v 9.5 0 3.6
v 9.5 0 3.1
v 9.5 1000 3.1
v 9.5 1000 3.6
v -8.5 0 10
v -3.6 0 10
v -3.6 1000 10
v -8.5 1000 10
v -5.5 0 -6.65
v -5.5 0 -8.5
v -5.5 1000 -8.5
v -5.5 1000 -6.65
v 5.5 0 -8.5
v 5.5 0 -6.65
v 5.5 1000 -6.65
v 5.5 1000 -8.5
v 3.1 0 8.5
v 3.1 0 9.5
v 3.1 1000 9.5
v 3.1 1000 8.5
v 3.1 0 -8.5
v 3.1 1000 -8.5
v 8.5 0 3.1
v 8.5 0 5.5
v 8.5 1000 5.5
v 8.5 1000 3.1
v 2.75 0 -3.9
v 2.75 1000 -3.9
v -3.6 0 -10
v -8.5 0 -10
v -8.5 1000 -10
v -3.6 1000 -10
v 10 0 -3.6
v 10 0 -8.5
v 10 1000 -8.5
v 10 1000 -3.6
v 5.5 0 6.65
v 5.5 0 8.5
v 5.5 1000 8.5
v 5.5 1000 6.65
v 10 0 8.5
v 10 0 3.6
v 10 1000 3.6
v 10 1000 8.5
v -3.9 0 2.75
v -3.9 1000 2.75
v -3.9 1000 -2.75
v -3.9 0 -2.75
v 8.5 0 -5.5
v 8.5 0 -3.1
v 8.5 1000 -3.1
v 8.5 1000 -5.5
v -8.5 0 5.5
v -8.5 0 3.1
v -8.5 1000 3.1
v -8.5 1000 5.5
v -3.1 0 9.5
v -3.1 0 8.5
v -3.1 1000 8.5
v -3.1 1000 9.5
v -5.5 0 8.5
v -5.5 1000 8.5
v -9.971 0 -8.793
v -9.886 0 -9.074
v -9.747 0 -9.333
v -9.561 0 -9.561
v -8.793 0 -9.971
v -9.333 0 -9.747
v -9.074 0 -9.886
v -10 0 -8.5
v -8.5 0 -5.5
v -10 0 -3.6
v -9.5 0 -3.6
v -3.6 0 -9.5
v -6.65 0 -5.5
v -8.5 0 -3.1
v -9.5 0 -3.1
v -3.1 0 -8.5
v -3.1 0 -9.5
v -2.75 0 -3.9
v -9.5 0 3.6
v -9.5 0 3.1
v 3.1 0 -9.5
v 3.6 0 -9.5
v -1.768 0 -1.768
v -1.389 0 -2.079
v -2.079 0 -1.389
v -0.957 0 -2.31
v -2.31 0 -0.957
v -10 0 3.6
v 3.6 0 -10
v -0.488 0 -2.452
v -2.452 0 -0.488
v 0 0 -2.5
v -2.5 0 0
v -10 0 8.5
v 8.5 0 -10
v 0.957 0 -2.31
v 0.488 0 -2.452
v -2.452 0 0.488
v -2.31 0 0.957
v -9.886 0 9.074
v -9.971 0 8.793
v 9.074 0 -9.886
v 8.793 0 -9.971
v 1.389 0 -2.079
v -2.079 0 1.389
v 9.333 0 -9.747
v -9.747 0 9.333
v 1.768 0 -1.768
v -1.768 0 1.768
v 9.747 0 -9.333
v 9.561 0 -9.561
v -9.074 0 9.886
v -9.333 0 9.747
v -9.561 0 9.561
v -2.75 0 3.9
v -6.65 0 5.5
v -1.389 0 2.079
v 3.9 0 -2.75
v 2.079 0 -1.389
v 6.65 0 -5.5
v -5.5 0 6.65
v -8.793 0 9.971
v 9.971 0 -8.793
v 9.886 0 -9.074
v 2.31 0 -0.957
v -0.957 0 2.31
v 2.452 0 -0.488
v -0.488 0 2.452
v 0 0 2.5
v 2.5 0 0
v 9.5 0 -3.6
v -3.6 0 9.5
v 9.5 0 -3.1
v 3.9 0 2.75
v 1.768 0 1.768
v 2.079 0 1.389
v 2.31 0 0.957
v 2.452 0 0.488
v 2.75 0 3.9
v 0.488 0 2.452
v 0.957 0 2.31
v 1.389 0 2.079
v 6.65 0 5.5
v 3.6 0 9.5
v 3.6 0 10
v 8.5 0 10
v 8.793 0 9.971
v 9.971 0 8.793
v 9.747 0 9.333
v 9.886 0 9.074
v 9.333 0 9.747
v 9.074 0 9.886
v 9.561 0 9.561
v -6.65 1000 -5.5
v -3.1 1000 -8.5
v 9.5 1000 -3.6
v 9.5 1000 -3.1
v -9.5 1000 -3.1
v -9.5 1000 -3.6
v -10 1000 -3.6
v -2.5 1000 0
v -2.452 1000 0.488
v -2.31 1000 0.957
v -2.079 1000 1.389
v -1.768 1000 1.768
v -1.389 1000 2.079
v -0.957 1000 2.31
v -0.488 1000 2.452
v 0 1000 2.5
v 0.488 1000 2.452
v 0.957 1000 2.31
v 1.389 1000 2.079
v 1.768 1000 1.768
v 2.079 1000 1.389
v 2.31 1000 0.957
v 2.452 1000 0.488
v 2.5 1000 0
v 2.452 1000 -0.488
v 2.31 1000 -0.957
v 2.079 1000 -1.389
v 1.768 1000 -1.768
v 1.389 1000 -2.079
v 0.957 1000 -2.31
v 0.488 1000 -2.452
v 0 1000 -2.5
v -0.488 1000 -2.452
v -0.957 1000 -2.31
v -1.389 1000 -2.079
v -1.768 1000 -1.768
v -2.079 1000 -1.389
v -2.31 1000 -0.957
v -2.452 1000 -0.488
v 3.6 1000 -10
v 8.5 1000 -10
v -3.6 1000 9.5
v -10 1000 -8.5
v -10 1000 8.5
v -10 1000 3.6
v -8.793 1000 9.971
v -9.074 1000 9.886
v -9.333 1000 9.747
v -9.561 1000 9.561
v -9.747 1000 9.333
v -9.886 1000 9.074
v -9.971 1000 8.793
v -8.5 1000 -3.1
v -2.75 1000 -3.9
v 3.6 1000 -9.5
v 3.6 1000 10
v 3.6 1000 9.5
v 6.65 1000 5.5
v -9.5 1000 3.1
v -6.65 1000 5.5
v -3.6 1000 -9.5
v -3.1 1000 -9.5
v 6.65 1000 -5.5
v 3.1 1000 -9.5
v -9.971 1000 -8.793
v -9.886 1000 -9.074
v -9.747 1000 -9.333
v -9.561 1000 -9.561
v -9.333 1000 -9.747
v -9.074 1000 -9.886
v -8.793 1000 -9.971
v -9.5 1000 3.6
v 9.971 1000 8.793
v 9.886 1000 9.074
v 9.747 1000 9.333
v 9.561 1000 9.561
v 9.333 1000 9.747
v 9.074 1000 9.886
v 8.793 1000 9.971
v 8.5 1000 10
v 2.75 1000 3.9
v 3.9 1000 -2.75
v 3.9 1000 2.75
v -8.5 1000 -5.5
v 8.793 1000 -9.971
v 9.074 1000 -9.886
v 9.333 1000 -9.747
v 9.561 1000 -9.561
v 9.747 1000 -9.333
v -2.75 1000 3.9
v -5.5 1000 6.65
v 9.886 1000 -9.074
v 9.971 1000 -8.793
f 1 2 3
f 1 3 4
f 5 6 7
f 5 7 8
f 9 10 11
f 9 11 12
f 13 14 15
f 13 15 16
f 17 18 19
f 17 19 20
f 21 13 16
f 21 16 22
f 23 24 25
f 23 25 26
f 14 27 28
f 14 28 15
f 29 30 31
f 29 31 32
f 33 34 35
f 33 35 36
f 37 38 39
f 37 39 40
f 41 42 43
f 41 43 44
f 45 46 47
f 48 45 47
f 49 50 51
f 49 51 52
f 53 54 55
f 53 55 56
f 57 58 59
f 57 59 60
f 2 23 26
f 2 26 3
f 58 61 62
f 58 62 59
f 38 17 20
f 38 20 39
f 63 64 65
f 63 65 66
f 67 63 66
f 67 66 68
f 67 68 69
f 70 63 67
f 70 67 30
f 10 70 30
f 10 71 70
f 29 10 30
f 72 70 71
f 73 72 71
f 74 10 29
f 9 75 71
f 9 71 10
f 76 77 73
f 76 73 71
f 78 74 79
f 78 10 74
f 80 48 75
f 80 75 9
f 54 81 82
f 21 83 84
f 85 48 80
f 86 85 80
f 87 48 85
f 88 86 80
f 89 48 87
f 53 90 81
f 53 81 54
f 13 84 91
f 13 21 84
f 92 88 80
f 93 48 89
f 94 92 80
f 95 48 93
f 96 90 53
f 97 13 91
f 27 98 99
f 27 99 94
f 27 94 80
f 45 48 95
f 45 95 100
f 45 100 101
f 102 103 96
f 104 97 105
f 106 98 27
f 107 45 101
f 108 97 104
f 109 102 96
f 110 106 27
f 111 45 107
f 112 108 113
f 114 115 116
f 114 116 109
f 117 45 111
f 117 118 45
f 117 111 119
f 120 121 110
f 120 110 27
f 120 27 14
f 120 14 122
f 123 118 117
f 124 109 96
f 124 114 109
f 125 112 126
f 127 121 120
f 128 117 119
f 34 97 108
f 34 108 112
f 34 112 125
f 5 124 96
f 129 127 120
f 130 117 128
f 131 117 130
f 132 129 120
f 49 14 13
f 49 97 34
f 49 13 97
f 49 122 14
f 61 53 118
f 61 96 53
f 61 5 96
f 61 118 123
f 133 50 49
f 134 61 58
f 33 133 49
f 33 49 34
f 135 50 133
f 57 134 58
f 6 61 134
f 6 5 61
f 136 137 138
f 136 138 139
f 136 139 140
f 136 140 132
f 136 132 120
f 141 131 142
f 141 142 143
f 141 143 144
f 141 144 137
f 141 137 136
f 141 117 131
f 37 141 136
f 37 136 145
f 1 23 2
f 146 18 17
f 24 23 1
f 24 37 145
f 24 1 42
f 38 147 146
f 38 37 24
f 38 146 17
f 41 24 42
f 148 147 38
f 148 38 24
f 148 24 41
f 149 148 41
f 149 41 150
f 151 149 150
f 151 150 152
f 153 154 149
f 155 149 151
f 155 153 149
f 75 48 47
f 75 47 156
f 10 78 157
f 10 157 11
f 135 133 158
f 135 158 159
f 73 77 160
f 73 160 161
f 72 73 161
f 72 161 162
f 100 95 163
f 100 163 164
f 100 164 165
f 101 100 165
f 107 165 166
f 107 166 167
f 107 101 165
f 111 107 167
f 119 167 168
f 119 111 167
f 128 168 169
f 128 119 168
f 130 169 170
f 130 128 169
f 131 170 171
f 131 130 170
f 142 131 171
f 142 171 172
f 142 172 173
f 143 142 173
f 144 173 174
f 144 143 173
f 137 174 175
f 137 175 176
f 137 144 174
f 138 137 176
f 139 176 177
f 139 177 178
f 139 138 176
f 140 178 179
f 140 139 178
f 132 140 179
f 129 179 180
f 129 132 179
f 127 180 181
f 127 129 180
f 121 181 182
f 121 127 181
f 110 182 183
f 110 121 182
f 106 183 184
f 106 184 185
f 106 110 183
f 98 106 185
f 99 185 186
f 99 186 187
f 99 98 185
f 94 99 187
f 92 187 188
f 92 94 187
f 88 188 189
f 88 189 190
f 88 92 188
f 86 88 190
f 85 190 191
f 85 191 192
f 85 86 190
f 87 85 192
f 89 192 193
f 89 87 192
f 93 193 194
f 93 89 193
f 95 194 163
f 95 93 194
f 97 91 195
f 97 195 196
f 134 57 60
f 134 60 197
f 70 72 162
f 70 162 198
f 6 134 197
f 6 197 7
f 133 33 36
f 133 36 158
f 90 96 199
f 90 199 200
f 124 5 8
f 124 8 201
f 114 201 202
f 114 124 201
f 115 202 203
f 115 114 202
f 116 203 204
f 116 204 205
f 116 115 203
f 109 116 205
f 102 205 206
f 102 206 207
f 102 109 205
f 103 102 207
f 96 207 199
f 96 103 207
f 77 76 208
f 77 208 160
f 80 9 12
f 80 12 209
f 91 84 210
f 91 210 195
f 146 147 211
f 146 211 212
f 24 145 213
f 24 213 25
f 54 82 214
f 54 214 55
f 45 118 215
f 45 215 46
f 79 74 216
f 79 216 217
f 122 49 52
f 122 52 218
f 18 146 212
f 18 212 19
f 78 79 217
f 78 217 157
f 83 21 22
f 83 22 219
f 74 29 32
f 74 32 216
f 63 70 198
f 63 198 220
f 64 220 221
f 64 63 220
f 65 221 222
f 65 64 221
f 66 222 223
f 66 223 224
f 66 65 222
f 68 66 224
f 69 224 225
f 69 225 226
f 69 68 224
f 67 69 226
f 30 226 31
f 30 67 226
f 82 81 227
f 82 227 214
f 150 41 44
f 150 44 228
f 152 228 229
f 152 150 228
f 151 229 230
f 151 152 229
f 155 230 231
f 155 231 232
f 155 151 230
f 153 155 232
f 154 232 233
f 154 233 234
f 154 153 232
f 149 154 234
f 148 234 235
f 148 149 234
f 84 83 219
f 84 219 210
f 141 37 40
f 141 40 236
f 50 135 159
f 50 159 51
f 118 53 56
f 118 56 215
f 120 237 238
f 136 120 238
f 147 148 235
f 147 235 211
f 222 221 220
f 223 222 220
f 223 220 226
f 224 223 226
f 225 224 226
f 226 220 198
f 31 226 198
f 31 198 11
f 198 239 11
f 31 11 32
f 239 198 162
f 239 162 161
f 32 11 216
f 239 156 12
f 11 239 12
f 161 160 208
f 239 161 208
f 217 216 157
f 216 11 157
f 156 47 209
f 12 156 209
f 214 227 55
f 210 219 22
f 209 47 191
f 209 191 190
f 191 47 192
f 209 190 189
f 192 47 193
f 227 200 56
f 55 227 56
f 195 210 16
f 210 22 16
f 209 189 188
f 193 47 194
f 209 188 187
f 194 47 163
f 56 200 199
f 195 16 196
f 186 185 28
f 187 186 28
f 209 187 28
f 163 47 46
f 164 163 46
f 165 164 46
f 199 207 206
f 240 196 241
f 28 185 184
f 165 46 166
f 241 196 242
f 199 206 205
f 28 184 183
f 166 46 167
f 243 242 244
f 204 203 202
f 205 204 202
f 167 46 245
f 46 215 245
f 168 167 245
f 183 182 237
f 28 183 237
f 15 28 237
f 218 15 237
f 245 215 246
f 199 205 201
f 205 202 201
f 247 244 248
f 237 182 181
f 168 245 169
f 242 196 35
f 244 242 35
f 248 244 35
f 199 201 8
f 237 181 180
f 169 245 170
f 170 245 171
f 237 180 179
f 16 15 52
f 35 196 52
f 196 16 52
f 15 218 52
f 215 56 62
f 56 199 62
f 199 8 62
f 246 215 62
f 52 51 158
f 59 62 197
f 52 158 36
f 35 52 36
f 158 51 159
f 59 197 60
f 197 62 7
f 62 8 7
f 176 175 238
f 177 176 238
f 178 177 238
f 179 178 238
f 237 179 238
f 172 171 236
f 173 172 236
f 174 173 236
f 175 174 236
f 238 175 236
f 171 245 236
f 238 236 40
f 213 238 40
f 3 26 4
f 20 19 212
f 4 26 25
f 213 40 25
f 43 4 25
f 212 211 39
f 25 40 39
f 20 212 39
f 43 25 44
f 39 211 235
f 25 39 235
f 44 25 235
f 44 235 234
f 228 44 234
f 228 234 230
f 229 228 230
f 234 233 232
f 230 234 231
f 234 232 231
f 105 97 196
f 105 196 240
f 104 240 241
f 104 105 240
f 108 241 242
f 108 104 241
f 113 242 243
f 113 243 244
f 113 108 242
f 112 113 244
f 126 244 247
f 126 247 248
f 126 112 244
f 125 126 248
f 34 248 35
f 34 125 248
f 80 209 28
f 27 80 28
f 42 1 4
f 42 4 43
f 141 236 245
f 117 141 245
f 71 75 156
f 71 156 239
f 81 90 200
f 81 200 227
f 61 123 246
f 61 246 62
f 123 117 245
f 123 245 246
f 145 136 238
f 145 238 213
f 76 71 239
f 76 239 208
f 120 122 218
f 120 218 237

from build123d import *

# Parameters (mm, degrees)
SKETCH1_R                = 2.5
F_20_X_20_X_R1_5_1_DEPTH = 1000


with BuildPart() as part:
    # Sketch1 → 铝型材 20 X 20 X R1.5(1) (new body)
    with BuildSketch(Plane(origin=(0, 0, 0), x_dir=(-1, 0, 0), z_dir=(0, 1, 0))):
        with BuildLine():
            Line((-3.6, 10), (-3.6, 9.5))
            Line((-3.6, 9.5), (-3.1, 9.5))
            Line((-3.1, 9.5), (-3.1, 8.5))
            Line((-3.1, 8.5), (-5.5, 8.5))
            Line((-5.5, 8.5), (-5.5, 6.65))
            Line((-5.5, 6.65), (-2.75, 3.9))
            Line((-2.75, 3.9), (2.75, 3.9))
            Line((2.75, 3.9), (5.5, 6.65))
            Line((5.5, 6.65), (5.5, 8.5))
            Line((5.5, 8.5), (3.1, 8.5))
            Line((3.1, 8.5), (3.1, 9.5))
            Line((3.1, 9.5), (3.6, 9.5))
            Line((3.6, 9.5), (3.6, 10))
            Line((3.6, 10), (8.5, 10))
            ThreePointArc((8.5, 10), (9.560660172, 9.560660172), (10, 8.5))
            Line((10, 8.5), (10, 3.6))
            Line((10, 3.6), (9.5, 3.6))
            Line((9.5, 3.6), (9.5, 3.1))
            Line((9.5, 3.1), (8.5, 3.1))
            Line((8.5, 3.1), (8.5, 5.5))
            Line((8.5, 5.5), (6.65, 5.5))
            Line((6.65, 5.5), (3.9, 2.75))
            Line((3.9, 2.75), (3.9, -2.75))
            Line((3.9, -2.75), (6.65, -5.5))
            Line((6.65, -5.5), (8.5, -5.5))
            Line((8.5, -5.5), (8.5, -3.1))
            Line((8.5, -3.1), (9.5, -3.1))
            Line((9.5, -3.1), (9.5, -3.6))
            Line((9.5, -3.6), (10, -3.6))
            Line((10, -3.6), (10, -8.5))
            ThreePointArc((10, -8.5), (9.560660172, -9.560660172), (8.5, -10))
            Line((8.5, -10), (3.6, -10))
            Line((3.6, -10), (3.6, -9.5))
            Line((3.6, -9.5), (3.1, -9.5))
            Line((3.1, -9.5), (3.1, -8.5))
            Line((3.1, -8.5), (5.5, -8.5))
            Line((5.5, -8.5), (5.5, -6.65))
            Line((5.5, -6.65), (2.75, -3.9))
            Line((2.75, -3.9), (-2.75, -3.9))
            Line((-2.75, -3.9), (-5.5, -6.65))
            Line((-5.5, -6.65), (-5.5, -8.5))
            Line((-5.5, -8.5), (-3.1, -8.5))
            Line((-3.1, -8.5), (-3.1, -9.5))
            Line((-3.1, -9.5), (-3.6, -9.5))
            Line((-3.6, -9.5), (-3.6, -10))
            Line((-3.6, -10), (-8.5, -10))
            ThreePointArc((-8.5, -10), (-9.560660172, -9.560660172), (-10, -8.5))
            Line((-10, -8.5), (-10, -3.6))
            Line((-10, -3.6), (-9.5, -3.6))
            Line((-9.5, -3.6), (-9.5, -3.1))
            Line((-9.5, -3.1), (-8.5, -3.1))
            Line((-8.5, -3.1), (-8.5, -5.5))
            Line((-8.5, -5.5), (-6.65, -5.5))
            Line((-6.65, -5.5), (-3.9, -2.75))
            Line((-3.9, -2.75), (-3.9, 2.75))
            Line((-3.9, 2.75), (-6.65, 5.5))
            Line((-6.65, 5.5), (-8.5, 5.5))
            Line((-8.5, 5.5), (-8.5, 3.1))
            Line((-8.5, 3.1), (-9.5, 3.1))
            Line((-9.5, 3.1), (-9.5, 3.6))
            Line((-9.5, 3.6), (-10, 3.6))
            Line((-10, 3.6), (-10, 8.5))
            ThreePointArc((-10, 8.5), (-9.560660172, 9.560660172), (-8.5, 10))
            Line((-8.5, 10), (-3.6, 10))
        make_face()
        Circle(SKETCH1_R, mode=Mode.SUBTRACT)
    extrude(amount=F_20_X_20_X_R1_5_1_DEPTH)


solid = part.part
